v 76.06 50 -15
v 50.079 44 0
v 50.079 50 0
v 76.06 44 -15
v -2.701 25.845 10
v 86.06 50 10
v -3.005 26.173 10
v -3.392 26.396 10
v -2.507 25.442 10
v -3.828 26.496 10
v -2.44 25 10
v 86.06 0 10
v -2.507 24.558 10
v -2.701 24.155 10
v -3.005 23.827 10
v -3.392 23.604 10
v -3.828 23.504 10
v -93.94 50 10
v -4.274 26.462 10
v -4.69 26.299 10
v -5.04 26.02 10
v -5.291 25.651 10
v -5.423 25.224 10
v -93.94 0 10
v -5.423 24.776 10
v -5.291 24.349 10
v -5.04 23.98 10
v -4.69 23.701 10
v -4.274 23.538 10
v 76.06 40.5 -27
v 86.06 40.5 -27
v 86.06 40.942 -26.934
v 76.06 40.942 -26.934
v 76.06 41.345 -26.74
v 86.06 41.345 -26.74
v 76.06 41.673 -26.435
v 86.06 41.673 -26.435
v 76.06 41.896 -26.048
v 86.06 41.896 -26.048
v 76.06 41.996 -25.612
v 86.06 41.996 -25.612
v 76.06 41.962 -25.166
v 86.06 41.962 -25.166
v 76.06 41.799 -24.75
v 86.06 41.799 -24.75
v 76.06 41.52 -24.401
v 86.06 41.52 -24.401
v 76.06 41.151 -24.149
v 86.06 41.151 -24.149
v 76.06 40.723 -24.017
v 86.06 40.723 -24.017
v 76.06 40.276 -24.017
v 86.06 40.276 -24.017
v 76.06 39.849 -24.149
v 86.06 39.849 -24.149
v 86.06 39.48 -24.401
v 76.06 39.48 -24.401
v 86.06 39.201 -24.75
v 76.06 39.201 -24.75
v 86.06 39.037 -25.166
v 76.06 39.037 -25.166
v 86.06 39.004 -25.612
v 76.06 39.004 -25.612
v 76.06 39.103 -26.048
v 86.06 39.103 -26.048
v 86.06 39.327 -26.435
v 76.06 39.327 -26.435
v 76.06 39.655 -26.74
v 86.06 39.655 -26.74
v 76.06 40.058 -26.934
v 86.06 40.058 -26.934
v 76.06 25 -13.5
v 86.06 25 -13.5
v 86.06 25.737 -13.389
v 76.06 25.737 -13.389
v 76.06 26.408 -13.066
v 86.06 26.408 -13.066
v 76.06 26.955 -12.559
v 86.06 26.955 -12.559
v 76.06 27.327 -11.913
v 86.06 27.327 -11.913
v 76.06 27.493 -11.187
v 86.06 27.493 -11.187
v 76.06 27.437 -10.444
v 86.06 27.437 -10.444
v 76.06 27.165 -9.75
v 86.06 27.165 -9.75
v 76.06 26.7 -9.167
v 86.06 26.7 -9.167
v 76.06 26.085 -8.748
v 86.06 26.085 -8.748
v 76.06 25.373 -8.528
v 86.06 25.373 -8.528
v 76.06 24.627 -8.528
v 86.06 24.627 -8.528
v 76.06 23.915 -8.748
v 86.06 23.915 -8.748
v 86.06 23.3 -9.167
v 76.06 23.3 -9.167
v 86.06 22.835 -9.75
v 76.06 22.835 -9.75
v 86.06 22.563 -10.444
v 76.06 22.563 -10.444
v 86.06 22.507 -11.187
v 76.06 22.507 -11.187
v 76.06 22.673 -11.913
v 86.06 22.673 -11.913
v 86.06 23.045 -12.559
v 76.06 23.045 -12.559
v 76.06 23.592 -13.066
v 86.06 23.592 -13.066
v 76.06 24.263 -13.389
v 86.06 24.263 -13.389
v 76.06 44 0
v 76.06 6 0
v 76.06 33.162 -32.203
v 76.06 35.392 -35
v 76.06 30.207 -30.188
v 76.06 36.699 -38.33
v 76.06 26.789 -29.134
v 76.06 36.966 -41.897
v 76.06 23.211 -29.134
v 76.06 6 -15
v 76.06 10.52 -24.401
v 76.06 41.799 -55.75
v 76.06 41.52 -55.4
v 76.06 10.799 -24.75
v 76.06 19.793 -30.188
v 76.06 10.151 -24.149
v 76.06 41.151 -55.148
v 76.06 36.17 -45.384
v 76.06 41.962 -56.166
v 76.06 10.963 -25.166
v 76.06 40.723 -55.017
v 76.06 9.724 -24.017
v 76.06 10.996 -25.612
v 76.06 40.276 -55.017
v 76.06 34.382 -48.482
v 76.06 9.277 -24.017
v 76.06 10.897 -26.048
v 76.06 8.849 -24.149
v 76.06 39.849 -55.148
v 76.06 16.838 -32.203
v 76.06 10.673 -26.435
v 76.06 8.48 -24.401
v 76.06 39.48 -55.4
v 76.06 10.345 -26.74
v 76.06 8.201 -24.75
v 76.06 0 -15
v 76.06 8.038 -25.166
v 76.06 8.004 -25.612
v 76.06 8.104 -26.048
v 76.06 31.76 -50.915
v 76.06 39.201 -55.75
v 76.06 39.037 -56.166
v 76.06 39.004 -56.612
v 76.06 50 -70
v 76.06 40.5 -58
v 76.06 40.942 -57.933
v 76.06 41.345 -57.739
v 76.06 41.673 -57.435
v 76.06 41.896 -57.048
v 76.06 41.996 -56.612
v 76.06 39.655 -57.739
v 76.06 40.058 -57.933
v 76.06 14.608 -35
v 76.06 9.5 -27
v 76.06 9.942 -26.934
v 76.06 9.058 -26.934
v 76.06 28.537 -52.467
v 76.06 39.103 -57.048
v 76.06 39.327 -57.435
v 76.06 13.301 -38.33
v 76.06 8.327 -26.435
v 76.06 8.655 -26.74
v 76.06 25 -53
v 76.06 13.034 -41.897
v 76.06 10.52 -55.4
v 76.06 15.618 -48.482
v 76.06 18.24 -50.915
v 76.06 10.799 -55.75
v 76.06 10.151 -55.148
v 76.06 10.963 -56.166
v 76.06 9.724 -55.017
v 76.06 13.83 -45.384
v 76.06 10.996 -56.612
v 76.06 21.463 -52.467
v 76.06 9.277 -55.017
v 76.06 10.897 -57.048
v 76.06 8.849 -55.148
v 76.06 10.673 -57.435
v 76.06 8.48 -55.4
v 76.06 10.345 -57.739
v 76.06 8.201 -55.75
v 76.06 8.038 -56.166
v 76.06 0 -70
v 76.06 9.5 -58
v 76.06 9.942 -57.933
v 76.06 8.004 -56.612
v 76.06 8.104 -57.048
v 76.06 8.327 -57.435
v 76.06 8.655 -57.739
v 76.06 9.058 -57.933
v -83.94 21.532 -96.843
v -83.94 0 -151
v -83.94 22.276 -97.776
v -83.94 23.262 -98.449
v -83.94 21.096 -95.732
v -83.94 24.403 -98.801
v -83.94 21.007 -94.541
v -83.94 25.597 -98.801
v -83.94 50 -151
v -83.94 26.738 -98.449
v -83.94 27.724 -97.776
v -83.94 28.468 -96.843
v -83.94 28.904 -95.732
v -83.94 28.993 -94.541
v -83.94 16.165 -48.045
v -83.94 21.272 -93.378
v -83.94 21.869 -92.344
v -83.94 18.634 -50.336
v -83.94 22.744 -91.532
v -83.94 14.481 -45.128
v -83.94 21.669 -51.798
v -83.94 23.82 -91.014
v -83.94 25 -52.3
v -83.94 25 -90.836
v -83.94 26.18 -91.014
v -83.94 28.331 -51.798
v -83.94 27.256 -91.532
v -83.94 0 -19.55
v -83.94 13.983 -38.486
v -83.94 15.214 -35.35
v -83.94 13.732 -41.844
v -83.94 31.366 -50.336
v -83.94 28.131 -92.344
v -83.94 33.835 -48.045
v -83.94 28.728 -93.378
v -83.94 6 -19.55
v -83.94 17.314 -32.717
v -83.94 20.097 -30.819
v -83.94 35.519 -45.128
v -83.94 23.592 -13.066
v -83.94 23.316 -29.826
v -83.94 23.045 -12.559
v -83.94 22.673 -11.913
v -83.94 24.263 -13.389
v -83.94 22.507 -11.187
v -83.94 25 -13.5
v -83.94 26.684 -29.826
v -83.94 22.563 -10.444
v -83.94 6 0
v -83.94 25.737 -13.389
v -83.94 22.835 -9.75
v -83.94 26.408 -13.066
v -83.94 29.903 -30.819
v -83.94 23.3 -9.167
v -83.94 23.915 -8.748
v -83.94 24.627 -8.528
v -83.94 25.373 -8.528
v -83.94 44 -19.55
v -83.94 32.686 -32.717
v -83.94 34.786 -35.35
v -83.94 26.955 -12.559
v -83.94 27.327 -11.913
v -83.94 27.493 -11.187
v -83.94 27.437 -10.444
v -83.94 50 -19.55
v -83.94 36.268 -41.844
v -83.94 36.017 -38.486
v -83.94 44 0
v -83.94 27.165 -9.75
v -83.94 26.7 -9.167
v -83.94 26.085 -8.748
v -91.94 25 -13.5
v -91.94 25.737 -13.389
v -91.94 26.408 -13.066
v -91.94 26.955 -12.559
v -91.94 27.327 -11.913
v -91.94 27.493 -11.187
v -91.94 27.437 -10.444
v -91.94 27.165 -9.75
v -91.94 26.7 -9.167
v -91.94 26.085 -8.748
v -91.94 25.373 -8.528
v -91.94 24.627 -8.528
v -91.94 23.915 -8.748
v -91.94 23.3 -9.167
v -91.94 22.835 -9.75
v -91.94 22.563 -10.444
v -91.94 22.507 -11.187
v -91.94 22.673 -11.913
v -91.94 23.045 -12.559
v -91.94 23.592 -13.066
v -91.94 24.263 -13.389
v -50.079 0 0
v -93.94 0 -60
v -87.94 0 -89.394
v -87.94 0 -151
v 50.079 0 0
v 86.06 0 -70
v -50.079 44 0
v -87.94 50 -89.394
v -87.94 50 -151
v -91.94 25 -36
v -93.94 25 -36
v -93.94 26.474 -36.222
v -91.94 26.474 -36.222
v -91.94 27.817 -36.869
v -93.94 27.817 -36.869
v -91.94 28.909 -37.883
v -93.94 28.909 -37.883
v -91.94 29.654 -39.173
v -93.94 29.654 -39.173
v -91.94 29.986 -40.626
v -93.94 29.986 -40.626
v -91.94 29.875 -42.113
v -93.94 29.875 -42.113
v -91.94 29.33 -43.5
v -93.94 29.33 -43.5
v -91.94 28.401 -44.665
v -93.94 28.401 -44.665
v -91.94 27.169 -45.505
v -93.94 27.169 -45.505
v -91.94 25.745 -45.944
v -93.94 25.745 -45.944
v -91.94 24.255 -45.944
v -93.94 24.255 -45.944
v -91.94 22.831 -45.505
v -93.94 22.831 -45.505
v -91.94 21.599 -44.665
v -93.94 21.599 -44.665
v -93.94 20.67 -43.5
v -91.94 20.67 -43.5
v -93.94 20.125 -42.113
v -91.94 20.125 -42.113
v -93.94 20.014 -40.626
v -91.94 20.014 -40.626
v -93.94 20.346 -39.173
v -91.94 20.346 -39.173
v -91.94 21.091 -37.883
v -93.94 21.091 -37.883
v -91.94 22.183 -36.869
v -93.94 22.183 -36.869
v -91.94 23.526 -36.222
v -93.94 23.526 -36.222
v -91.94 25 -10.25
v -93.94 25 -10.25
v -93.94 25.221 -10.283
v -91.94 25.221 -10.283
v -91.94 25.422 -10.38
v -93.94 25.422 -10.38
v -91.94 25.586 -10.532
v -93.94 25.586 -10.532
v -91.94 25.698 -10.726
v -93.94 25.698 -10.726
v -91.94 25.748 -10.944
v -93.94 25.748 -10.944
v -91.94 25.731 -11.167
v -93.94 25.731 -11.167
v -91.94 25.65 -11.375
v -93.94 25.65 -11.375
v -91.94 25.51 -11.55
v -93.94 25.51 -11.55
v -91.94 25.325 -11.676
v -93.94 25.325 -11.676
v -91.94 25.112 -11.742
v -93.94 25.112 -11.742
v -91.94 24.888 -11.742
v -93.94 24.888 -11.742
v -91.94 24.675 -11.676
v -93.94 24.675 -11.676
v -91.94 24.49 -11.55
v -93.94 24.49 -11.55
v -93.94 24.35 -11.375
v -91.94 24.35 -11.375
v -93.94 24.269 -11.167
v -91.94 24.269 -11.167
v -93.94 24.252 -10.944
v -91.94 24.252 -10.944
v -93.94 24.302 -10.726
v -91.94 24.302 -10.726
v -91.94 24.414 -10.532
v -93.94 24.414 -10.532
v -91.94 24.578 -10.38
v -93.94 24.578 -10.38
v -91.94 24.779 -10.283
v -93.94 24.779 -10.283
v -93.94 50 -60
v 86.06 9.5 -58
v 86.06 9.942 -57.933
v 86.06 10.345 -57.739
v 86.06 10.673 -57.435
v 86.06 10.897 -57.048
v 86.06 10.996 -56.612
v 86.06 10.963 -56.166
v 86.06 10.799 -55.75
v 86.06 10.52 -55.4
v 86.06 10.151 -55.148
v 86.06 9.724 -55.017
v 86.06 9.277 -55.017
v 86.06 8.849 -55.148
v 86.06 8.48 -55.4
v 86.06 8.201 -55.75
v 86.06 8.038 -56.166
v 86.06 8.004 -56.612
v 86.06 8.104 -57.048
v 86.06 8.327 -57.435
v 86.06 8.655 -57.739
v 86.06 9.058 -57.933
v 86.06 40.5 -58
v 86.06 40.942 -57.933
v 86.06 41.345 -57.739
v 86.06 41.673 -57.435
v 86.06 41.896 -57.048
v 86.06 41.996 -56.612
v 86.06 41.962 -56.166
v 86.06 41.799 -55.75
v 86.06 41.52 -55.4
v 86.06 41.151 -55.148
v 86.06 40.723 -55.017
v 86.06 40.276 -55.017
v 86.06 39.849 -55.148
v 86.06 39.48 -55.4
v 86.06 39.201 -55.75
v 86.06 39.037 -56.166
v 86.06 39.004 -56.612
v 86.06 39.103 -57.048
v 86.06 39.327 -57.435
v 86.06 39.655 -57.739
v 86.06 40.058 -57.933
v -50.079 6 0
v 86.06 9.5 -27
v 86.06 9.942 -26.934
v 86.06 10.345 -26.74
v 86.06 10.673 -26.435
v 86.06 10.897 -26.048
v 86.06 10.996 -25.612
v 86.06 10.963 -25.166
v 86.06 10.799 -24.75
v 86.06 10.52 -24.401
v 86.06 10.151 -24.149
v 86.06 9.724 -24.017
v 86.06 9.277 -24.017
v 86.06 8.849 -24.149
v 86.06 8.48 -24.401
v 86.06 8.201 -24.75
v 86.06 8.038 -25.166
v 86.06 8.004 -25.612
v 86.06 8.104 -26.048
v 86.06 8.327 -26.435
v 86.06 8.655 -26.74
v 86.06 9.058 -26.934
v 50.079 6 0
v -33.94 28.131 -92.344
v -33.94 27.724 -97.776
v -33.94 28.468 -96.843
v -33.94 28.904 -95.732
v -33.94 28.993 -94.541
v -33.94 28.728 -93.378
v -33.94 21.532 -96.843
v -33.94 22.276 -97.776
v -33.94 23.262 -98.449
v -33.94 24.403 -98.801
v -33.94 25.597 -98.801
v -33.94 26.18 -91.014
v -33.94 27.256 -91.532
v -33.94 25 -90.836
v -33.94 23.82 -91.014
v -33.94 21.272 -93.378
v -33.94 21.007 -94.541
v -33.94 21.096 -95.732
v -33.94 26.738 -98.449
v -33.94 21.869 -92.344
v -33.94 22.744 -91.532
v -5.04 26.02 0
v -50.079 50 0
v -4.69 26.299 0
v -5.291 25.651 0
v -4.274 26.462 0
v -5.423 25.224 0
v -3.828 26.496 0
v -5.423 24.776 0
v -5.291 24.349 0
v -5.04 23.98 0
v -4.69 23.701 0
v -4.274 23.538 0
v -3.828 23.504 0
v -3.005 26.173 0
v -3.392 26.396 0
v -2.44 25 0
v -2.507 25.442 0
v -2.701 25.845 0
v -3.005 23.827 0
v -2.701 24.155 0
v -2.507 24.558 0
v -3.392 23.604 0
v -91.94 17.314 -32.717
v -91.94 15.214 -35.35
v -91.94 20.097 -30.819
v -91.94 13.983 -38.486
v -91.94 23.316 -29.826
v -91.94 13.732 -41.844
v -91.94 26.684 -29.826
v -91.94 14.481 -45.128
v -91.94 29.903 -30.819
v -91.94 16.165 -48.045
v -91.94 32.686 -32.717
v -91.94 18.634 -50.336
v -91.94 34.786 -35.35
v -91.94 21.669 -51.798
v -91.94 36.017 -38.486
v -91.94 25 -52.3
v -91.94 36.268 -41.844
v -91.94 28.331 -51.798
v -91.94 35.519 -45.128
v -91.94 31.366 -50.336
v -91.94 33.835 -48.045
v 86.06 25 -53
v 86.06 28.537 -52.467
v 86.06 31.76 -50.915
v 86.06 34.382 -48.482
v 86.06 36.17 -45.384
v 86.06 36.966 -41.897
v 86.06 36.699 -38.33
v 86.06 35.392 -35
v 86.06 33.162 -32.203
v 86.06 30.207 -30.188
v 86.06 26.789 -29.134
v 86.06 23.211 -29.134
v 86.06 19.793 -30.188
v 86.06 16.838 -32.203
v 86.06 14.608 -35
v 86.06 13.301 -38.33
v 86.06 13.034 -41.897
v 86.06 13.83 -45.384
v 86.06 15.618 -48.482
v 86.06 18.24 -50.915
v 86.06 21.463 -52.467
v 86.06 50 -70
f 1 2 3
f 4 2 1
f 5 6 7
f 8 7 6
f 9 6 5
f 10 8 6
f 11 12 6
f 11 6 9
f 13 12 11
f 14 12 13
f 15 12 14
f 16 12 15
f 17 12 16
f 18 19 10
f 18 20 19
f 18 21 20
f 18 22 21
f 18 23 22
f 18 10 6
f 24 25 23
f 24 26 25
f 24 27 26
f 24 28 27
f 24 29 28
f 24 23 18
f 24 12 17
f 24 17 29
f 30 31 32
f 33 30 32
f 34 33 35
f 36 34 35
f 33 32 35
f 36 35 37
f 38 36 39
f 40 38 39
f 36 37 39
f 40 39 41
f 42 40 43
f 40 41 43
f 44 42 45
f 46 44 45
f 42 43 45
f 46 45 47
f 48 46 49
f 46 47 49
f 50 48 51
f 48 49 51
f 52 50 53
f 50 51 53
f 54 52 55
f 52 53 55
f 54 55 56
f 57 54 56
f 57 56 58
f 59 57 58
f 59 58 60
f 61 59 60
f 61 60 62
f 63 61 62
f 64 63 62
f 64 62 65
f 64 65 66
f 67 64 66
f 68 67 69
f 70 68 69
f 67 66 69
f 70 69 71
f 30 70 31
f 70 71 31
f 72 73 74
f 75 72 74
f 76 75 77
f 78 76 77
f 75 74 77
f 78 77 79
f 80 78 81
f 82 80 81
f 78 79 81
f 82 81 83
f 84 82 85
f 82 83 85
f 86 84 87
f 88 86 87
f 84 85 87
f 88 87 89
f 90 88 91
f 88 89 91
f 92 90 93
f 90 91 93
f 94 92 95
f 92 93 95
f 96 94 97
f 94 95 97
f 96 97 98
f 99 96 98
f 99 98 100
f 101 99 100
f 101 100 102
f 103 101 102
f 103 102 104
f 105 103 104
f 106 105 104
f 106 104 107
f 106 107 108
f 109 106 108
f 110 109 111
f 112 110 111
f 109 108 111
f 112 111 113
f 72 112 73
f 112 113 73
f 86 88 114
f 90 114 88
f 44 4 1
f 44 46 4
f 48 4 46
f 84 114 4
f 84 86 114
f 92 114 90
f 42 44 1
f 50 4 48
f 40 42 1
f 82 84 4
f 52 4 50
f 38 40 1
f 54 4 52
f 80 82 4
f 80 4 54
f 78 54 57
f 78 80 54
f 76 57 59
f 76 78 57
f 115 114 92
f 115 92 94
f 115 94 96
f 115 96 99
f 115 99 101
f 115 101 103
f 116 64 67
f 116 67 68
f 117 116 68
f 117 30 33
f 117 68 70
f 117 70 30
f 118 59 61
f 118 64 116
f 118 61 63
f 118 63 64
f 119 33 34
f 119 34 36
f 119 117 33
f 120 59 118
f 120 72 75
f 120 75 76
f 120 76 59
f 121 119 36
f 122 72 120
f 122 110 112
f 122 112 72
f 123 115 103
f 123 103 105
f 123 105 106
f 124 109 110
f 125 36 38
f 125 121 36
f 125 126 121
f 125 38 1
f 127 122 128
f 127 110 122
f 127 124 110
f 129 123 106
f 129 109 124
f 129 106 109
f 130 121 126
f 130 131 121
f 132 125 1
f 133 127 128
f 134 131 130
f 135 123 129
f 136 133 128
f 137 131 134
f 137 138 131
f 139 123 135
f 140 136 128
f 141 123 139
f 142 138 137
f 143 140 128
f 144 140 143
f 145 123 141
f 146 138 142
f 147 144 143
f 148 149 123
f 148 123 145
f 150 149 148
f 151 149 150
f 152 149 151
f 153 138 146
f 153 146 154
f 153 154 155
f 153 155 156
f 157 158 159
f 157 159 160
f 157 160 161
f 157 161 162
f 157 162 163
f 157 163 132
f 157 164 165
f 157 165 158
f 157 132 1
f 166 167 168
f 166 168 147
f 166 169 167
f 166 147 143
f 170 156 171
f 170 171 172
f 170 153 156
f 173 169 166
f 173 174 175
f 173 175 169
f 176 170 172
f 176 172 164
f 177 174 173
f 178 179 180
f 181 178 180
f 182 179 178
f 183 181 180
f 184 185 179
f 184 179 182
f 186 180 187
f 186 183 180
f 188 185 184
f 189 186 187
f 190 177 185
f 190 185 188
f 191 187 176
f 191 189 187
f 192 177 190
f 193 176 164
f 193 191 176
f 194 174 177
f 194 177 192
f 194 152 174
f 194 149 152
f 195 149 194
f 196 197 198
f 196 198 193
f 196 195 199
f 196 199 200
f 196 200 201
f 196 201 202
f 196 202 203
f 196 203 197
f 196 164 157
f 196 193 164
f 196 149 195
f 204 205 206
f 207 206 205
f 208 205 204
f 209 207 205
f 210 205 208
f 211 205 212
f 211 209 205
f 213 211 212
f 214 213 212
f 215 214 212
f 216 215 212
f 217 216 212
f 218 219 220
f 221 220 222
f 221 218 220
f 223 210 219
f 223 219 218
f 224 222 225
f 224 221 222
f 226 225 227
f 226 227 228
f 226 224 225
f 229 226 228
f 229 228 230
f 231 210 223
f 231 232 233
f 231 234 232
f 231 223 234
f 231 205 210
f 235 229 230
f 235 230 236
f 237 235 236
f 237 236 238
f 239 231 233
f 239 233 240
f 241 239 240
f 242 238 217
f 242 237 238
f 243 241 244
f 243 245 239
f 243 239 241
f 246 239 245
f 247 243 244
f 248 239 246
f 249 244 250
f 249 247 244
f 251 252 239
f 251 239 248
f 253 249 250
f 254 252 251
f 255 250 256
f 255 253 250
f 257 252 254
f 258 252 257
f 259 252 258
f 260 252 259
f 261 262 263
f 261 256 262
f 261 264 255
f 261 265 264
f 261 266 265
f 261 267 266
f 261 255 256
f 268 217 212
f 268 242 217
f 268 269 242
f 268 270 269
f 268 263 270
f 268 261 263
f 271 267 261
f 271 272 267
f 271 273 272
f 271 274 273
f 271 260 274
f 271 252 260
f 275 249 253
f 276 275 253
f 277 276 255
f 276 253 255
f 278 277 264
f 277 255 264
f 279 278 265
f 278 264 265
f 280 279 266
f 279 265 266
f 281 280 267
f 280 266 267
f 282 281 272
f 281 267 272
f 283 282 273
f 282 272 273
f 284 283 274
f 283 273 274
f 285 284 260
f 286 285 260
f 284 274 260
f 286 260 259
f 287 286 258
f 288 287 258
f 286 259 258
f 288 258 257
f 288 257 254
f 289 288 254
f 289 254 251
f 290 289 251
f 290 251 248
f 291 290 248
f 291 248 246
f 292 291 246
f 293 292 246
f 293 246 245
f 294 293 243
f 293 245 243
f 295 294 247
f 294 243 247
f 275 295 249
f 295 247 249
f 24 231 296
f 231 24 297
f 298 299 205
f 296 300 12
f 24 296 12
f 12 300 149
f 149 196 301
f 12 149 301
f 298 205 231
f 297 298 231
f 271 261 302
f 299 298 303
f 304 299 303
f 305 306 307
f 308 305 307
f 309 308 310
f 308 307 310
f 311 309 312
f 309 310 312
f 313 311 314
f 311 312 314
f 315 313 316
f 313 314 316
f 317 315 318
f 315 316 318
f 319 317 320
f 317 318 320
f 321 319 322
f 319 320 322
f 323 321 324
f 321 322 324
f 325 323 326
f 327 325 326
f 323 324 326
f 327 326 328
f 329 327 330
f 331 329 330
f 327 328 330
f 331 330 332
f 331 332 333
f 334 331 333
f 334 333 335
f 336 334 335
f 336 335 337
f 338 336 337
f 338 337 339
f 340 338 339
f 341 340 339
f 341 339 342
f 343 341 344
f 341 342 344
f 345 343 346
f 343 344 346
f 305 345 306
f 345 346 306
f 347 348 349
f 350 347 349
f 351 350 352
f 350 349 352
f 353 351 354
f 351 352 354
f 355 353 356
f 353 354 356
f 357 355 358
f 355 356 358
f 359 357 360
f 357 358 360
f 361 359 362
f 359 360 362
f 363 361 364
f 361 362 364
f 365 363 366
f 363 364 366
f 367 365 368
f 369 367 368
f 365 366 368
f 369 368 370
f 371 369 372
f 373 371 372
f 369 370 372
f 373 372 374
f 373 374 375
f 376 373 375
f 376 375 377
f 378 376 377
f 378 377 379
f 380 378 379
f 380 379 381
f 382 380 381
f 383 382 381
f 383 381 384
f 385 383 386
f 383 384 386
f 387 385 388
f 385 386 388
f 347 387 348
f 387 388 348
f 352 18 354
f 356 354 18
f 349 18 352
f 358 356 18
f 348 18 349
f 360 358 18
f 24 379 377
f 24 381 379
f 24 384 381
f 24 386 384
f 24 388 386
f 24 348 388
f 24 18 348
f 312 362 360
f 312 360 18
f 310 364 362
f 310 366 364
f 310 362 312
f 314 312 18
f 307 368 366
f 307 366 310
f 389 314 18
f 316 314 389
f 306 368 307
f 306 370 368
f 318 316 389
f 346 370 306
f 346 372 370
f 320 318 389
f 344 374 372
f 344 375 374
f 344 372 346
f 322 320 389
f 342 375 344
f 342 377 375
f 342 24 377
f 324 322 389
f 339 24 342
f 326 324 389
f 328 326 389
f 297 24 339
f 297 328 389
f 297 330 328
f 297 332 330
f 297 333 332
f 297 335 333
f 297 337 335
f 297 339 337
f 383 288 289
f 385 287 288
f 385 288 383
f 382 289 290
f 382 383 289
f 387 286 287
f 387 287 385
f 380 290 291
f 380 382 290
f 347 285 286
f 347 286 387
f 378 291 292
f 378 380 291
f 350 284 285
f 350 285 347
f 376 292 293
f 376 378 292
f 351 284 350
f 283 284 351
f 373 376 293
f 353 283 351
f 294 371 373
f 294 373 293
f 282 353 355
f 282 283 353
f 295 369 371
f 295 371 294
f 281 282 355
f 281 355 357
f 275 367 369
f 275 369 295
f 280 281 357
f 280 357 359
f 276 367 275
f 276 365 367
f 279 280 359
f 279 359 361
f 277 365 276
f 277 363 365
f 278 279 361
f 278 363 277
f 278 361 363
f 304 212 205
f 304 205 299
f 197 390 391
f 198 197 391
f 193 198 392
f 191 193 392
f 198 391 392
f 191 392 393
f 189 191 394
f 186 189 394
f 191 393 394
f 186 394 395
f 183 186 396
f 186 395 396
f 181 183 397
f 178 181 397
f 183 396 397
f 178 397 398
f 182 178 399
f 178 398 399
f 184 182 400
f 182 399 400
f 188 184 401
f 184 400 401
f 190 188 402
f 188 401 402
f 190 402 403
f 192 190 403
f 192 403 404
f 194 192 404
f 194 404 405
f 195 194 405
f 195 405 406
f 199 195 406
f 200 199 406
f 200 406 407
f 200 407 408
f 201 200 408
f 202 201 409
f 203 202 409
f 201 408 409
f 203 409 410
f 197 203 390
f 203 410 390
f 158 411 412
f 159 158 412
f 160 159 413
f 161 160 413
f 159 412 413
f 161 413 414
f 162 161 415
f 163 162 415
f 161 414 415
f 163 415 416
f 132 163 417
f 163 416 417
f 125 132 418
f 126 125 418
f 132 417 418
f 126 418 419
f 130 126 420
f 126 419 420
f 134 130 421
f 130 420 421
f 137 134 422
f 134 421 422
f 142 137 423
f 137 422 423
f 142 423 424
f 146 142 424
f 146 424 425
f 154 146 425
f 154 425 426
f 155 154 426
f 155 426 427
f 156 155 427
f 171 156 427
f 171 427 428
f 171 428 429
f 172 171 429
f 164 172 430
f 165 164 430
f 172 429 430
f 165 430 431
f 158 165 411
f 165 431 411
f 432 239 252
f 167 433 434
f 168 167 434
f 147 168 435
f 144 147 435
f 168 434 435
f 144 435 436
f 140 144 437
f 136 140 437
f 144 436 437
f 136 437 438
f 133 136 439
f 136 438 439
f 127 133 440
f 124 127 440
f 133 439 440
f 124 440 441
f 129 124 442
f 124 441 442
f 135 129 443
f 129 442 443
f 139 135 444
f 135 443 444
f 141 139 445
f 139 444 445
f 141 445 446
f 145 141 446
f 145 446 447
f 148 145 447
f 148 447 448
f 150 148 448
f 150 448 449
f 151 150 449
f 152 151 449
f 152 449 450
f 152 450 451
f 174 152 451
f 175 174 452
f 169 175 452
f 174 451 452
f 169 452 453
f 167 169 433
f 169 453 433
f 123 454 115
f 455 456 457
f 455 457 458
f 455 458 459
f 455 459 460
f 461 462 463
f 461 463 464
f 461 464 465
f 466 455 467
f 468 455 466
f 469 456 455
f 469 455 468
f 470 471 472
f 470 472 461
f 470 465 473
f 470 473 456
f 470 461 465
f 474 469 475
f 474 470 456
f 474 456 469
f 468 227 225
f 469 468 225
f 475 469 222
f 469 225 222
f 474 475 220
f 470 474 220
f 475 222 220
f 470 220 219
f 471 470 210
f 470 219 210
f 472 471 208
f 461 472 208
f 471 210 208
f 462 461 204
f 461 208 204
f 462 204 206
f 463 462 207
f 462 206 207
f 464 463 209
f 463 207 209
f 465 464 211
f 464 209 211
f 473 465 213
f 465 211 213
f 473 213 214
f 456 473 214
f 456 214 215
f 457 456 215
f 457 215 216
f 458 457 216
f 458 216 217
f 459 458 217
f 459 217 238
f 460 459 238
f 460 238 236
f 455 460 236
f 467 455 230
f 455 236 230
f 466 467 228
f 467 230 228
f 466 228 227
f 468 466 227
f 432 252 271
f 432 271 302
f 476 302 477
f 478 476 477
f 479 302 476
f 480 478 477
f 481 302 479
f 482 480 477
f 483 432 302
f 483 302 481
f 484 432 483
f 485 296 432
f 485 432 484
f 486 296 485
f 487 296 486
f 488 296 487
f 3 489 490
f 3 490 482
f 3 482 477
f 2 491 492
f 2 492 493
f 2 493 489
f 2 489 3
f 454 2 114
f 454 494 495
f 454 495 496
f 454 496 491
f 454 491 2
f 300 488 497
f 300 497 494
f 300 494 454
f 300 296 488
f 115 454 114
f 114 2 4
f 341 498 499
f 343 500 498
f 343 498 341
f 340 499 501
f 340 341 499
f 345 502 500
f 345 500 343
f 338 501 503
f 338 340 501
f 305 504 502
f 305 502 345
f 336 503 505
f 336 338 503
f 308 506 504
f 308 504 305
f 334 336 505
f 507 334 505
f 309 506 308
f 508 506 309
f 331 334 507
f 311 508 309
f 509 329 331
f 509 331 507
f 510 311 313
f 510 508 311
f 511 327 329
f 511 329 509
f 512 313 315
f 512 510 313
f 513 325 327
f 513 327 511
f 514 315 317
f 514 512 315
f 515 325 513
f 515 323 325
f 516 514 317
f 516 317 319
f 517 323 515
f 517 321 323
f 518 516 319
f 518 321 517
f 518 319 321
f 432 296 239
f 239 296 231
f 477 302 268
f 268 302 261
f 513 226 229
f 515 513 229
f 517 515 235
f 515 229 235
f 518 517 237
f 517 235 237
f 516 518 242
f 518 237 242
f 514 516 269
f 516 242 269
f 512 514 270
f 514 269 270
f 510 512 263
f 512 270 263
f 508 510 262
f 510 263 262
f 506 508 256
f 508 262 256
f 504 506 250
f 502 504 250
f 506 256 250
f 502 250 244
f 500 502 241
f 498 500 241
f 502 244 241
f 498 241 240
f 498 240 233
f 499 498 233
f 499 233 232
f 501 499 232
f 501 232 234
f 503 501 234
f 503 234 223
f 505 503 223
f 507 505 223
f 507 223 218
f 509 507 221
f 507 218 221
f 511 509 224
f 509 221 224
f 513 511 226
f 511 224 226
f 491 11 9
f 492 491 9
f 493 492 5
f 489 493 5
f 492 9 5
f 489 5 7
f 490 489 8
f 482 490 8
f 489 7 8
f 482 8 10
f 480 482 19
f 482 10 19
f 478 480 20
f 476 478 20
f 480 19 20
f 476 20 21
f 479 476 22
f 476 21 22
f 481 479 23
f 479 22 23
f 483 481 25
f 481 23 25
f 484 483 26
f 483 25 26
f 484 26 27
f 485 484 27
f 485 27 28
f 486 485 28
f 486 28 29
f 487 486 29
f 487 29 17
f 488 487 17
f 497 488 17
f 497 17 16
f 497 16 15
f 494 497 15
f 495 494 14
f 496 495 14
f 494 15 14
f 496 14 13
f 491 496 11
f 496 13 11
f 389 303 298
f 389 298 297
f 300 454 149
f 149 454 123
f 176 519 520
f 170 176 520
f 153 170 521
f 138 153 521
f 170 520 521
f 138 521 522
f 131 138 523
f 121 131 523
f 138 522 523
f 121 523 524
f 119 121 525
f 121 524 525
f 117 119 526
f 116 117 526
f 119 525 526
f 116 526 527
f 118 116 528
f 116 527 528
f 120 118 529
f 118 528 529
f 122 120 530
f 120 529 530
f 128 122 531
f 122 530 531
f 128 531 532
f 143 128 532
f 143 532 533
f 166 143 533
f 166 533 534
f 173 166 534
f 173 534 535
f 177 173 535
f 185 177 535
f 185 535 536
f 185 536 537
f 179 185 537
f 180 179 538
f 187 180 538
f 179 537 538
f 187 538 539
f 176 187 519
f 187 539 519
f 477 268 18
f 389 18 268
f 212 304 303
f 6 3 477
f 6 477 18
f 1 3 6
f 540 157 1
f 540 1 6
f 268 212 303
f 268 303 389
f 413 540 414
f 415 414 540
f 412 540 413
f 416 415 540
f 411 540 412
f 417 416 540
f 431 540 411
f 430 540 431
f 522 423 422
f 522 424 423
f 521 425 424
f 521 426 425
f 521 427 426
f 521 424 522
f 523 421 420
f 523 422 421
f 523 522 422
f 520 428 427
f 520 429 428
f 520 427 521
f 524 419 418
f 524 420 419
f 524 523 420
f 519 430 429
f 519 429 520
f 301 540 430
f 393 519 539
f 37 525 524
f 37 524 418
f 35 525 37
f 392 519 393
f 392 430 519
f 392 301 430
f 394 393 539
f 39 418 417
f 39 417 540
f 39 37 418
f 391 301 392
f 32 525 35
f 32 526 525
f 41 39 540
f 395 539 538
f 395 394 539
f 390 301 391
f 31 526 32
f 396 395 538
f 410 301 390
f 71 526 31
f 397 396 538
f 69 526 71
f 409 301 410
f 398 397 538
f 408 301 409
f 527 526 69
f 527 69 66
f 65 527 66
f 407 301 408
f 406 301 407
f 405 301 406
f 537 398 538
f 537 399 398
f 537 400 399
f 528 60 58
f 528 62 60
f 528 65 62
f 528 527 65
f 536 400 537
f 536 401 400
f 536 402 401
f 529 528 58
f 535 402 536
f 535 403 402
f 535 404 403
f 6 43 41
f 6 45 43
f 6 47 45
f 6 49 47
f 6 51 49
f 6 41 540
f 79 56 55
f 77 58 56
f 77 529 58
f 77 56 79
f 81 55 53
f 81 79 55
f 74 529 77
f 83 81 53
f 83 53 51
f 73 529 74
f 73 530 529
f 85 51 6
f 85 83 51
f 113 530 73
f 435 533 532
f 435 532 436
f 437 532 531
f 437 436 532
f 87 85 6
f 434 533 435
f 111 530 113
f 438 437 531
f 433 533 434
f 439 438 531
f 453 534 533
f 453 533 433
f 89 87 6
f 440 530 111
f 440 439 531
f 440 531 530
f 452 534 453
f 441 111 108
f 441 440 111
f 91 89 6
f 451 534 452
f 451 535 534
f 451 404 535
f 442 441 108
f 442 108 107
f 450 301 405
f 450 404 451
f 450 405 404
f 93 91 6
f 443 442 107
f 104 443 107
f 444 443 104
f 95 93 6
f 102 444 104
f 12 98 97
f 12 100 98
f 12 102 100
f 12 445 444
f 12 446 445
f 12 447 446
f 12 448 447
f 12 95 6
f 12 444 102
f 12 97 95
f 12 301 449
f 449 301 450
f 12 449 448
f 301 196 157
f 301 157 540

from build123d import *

# Parameters (mm, degrees)
BOSS_EXTRUDE1_DEPTH = 50
SKETCH3_R           = 2.5
SKETCH3_R_2         = 12
SKETCH3_R_3         = 1.5
CUT_EXTRUDE1_DEPTH  = 10
RIB1_REACH          = 129.376
SKETCH4_WALL_W      = 286.752677288
SKETCH4_WALL_H      = 6
MIRROR2_DEPTH       = 6
MIRROR2_START       = 44
MIRROR2_2_DEPTH     = 6
SKETCH5_R           = 11.3
SKETCH5_R_2         = 2.5
CUT_EXTRUDE2_DEPTH  = 8
SKETCH6_R           = 5
SKETCH6_R_2         = 0.75
CUT_EXTRUDE3_DEPTH  = 2
SKETCH8_W           = 4
SKETCH8_H           = 50
BOSS_EXTRUDE2_DEPTH = 91
BOSS_EXTRUDE3_DEPTH = 50
SKETCH11_R          = 1.5
CUT_EXTRUDE4_DEPTH  = 10
SKETCH12_R          = 4.004666462
BOSS_EXTRUDE4_DEPTH = 50


# Read off the part's stored shape, not the designer's step: Mirror2
with BuildPart() as part:
    # Sketch2 → Boss-Extrude1 (new body)
    with BuildSketch(Plane(origin=(0, 0, 0), x_dir=(1, 0, 0), z_dir=(0, 1, 0))):
        Polygon((-83.940042827, 0), (76.059957173, 0), (76.059957173, 70), (86.059957173, 70), (86.059957173, -10), (-93.940042827, -10), (-93.940042827, 60), (-83.940042827, 60), align=None)
    extrude(amount=BOSS_EXTRUDE1_DEPTH)

    # Sketch3 → Cut-Extrude1 (cut)
    with BuildSketch(Plane(origin=(86.059957173, 0, 0), x_dir=(0, 0, -1), z_dir=(1, 0, 0))):
        with Locations((11, 25)):
            Circle(SKETCH3_R)
        with Locations((41, 25)):
            Circle(SKETCH3_R_2)
        with Locations((25.500219356, 40.499780644)):
            Circle(SKETCH3_R_3)
        with Locations((56.499780644, 40.499780644)):
            Circle(SKETCH3_R_3)
        with Locations((56.499780644, 9.500219356)):
            Circle(SKETCH3_R_3)
        with Locations((25.500219356, 9.500219356)):
            Circle(SKETCH3_R_3)
    extrude(amount=-CUT_EXTRUDE1_DEPTH, mode=Mode.SUBTRACT)

    # Sketch4 wall → Rib1 (add, up to next)
    with BuildSketch(Plane(origin=(63.069576117, 50, -7.5), x_dir=(0.86602540378, 0, -0.500000000008), z_dir=(-0.500000000008, 0, -0.86602540378)), mode=Mode.PRIVATE) as rib1_sk1:
        with Locations((0, 3)):
            Rectangle(SKETCH4_WALL_W, SKETCH4_WALL_H)
    rib1_tool1 = extrude(rib1_sk1.sketch, amount=-RIB1_REACH, mode=Mode.PRIVATE) - part.part
    rib1 = rib1_tool1.solids().sort_by_distance((63.069576117, 50, -7.5))[0]
    add(rib1)

    # Mirror1: Rib1 across plane
    add(rib1.mirror(Plane.ZX.offset(25)))

    # Mirror2 outline → Mirror2 (add)
    with BuildSketch(Plane(origin=(0, 0, 0), x_dir=(1, 0, 0), z_dir=(0, 1, 0))):
        Polygon((-83.940042827, 0), (-50.07919506, 0), (-83.940042827, 19.549569573), align=None)
    extrude(amount=MIRROR2_DEPTH)

    # Mirror2 2 outline → Mirror2 2 (add)
    with BuildSketch(Plane(origin=(0, 0, 0), x_dir=(1, 0, 0), z_dir=(0, 1, 0)).offset(MIRROR2_START)):
        Polygon((-83.940042827, 0), (-50.07919506, 0), (-83.940042827, 19.549569573), align=None)
    extrude(amount=MIRROR2_2_DEPTH)

    # Sketch5 → Cut-Extrude2 (cut)
    with BuildSketch(Plane(origin=(-83.940042827, 0, 0), x_dir=(0, 0, -1), z_dir=(1, 0, 0))):
        with Locations((41, 25)):
            Circle(SKETCH5_R)
        with Locations((11, 25)):
            Circle(SKETCH5_R_2)
    extrude(amount=-CUT_EXTRUDE2_DEPTH, mode=Mode.SUBTRACT)

    # Sketch6 → Cut-Extrude3 (cut)
    with BuildSketch(Plane.ZY.offset(93.940042827)):
        with Locations((-41, 25)):
            Circle(SKETCH6_R)
        with Locations((-11, 25)):
            Circle(SKETCH6_R_2)
    extrude(amount=-CUT_EXTRUDE3_DEPTH, mode=Mode.SUBTRACT)

    # Sketch8 → Boss-Extrude2 (add)
    with BuildSketch(Plane(origin=(0, 0, -60), x_dir=(-1, 0, 0), z_dir=(0, 0, -1))):
        with Locations((85.940042827, 25)):
            Rectangle(SKETCH8_W, SKETCH8_H)
    extrude(amount=BOSS_EXTRUDE2_DEPTH)

    # Sketch9 → Boss-Extrude3 (add)
    with BuildSketch(Plane(origin=(0, 50, 0), x_dir=(1, 0, 0), z_dir=(0, 1, 0))):
        Polygon((-87.940042827, 89.393876913), (-93.940042827, 60), (-87.940042827, 60), align=None)
    extrude(amount=-BOSS_EXTRUDE3_DEPTH)

    # Sketch11 → Cut-Extrude4 (cut)
    with BuildSketch(Plane.XY.offset(10)):
        with Locations((-3.940042827, 25)):
            Circle(SKETCH11_R)
    extrude(amount=-CUT_EXTRUDE4_DEPTH, mode=Mode.SUBTRACT)

    # Sketch12 → Boss-Extrude4 (add)
    with BuildSketch(Plane(origin=(-83.940042827, 0, 0), x_dir=(0, 0, -1), z_dir=(1, 0, 0))):
        with Locations(Location((94.840711844, 25, 0), (0, 0, 180))):
            Circle(SKETCH12_R)
    extrude(amount=BOSS_EXTRUDE4_DEPTH)


solid = part.part
